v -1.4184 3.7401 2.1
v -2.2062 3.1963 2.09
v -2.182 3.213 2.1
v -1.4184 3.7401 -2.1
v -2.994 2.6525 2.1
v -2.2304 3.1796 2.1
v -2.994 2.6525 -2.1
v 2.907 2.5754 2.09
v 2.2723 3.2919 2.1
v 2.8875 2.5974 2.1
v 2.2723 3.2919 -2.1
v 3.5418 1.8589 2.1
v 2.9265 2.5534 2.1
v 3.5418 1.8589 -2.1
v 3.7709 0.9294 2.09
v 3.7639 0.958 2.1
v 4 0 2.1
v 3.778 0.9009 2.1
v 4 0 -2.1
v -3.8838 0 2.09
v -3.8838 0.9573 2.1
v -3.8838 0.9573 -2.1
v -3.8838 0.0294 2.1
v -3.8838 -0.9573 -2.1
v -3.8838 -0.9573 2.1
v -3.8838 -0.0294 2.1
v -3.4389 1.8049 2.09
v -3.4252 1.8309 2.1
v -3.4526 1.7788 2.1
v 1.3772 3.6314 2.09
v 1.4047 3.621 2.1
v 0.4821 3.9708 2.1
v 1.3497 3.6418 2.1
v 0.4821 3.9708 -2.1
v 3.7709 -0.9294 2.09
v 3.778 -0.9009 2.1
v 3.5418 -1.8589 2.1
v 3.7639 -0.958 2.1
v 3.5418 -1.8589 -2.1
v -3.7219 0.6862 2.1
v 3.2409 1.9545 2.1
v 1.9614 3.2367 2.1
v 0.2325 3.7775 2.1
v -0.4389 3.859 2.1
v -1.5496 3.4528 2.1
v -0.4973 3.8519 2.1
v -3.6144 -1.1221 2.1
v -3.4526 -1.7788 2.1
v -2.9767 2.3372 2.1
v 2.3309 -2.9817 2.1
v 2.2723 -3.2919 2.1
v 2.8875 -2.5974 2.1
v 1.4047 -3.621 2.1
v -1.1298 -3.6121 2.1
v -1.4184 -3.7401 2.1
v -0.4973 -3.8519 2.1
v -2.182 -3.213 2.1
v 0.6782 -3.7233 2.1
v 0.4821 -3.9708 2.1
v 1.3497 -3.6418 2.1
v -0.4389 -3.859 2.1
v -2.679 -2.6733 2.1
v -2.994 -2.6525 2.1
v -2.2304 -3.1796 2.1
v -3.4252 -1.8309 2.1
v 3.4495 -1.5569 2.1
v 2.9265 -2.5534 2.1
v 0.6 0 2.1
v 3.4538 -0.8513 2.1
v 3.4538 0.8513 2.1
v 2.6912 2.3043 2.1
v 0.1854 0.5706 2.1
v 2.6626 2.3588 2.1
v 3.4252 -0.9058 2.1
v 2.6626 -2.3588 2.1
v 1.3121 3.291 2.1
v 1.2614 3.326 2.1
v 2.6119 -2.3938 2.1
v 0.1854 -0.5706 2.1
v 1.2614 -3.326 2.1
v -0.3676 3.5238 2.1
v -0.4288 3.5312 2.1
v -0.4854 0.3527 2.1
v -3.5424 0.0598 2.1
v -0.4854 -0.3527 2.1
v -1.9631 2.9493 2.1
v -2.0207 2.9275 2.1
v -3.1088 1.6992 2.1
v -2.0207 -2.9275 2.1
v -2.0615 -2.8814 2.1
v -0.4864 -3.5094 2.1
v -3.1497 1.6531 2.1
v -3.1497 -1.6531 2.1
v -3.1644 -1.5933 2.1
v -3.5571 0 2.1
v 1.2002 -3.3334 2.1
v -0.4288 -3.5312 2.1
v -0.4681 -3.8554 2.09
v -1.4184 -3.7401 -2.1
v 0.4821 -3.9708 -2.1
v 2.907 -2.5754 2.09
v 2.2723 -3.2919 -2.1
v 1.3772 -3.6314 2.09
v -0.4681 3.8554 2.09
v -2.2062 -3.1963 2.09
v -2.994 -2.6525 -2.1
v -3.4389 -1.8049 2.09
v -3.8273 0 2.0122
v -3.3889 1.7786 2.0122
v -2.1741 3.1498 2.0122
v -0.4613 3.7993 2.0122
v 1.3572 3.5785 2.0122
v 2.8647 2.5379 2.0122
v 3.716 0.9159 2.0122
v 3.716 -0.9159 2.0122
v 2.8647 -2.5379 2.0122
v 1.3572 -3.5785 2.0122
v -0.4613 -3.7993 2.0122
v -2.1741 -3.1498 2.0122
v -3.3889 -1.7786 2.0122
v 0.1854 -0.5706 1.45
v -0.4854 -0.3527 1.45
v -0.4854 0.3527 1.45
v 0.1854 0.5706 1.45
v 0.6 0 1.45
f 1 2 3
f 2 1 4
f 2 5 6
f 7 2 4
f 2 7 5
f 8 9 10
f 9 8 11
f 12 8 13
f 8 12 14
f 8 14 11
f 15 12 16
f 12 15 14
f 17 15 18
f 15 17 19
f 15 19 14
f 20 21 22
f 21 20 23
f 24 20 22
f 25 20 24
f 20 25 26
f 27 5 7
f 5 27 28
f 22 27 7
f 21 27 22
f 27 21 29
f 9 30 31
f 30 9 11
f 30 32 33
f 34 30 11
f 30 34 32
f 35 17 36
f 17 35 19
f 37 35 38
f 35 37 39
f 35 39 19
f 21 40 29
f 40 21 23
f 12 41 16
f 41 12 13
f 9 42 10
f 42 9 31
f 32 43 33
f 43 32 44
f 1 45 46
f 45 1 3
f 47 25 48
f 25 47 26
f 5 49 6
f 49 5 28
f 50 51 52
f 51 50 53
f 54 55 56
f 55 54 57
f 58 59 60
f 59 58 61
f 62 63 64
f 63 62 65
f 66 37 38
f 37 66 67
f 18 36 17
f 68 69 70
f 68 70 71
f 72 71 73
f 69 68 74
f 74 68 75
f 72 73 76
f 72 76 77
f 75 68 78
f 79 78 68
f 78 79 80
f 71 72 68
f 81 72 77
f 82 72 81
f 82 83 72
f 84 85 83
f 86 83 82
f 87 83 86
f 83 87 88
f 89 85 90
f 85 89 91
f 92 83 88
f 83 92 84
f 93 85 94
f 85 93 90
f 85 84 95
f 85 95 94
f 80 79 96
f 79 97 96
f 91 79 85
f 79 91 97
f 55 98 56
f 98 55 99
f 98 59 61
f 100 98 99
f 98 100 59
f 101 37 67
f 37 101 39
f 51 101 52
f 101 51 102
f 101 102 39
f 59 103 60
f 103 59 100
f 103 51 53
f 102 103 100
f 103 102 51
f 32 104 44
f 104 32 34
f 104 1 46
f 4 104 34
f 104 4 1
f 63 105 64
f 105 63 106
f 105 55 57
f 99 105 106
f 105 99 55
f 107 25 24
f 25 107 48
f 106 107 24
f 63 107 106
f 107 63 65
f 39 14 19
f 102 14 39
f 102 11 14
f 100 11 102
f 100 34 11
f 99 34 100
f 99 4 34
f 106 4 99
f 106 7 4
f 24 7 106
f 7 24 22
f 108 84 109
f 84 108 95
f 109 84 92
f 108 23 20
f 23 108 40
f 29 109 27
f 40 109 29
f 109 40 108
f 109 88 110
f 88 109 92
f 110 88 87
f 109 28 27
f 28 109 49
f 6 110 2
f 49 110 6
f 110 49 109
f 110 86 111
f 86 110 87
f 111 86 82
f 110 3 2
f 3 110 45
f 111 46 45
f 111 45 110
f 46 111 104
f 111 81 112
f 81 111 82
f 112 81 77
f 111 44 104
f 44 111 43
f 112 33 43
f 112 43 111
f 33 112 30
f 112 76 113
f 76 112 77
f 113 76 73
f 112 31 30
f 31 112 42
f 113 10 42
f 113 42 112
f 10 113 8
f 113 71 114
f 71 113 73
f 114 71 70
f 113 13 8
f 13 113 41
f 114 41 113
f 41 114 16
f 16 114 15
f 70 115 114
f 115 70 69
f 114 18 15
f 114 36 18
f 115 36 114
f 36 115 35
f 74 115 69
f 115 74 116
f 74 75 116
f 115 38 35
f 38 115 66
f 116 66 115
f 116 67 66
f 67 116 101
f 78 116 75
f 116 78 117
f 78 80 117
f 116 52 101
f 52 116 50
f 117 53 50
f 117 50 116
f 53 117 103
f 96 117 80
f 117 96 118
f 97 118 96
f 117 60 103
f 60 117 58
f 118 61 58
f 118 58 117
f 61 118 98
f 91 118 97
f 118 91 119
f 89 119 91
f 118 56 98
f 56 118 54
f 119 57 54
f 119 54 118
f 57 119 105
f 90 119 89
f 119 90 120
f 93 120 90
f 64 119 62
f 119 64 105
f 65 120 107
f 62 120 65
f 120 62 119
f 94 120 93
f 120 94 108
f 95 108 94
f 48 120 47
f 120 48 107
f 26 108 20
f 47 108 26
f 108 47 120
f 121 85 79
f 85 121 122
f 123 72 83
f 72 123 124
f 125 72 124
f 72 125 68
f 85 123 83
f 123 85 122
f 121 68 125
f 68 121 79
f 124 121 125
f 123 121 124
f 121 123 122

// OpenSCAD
// Parameters
magnet_diameter = 8.0; //[4.0:16.0:0.1]
magnet_height = 4.2; //[2.1:8.4:0.1]
edge_chamfer_size = 0.4; //[0.2:0.8:0.05]
edge_fillet_radius = 0.25; //[0.1:0.6:0.05]
polarity_mark_diameter = 1.2; //[0.6:2.4:0.1]
polarity_mark_depth = 0.25; //[0.1:0.6:0.05]
overlap = 0.8; //[0.5:2.0:0.1]

// Base Shapes
module magnet_body() {
  cylinder(h=magnet_height, r=magnet_diameter/2, center=true);
}

module edge_chamfer() {
  translate([0, 0, magnet_height/2 - edge_chamfer_size/2 + overlap/2])
    cylinder(h=edge_chamfer_size, r1=magnet_diameter/2, r2=0, center=true);
}

module edge_fillet() {
  translate([0, 0, magnet_height/2 - edge_fillet_radius + overlap/2])
    rotate_extrude() translate([magnet_diameter/2 - edge_fillet_radius, 0, 0])
    circle(r=edge_fillet_radius);
}

module polarity_mark() {
  translate([0, 0, magnet_height/2 - polarity_mark_depth/2])
    cylinder(h=polarity_mark_depth + overlap, r=polarity_mark_diameter/2, center=true);
}

// Final Geometry
module magnet_complete() {
  difference() {
    magnet_body();
    edge_chamfer();
    edge_fillet();
    polarity_mark();
  }
}

// Render the final magnet
color([0.72, 0.45, 0.2]) // Copper color
magnet_complete();
